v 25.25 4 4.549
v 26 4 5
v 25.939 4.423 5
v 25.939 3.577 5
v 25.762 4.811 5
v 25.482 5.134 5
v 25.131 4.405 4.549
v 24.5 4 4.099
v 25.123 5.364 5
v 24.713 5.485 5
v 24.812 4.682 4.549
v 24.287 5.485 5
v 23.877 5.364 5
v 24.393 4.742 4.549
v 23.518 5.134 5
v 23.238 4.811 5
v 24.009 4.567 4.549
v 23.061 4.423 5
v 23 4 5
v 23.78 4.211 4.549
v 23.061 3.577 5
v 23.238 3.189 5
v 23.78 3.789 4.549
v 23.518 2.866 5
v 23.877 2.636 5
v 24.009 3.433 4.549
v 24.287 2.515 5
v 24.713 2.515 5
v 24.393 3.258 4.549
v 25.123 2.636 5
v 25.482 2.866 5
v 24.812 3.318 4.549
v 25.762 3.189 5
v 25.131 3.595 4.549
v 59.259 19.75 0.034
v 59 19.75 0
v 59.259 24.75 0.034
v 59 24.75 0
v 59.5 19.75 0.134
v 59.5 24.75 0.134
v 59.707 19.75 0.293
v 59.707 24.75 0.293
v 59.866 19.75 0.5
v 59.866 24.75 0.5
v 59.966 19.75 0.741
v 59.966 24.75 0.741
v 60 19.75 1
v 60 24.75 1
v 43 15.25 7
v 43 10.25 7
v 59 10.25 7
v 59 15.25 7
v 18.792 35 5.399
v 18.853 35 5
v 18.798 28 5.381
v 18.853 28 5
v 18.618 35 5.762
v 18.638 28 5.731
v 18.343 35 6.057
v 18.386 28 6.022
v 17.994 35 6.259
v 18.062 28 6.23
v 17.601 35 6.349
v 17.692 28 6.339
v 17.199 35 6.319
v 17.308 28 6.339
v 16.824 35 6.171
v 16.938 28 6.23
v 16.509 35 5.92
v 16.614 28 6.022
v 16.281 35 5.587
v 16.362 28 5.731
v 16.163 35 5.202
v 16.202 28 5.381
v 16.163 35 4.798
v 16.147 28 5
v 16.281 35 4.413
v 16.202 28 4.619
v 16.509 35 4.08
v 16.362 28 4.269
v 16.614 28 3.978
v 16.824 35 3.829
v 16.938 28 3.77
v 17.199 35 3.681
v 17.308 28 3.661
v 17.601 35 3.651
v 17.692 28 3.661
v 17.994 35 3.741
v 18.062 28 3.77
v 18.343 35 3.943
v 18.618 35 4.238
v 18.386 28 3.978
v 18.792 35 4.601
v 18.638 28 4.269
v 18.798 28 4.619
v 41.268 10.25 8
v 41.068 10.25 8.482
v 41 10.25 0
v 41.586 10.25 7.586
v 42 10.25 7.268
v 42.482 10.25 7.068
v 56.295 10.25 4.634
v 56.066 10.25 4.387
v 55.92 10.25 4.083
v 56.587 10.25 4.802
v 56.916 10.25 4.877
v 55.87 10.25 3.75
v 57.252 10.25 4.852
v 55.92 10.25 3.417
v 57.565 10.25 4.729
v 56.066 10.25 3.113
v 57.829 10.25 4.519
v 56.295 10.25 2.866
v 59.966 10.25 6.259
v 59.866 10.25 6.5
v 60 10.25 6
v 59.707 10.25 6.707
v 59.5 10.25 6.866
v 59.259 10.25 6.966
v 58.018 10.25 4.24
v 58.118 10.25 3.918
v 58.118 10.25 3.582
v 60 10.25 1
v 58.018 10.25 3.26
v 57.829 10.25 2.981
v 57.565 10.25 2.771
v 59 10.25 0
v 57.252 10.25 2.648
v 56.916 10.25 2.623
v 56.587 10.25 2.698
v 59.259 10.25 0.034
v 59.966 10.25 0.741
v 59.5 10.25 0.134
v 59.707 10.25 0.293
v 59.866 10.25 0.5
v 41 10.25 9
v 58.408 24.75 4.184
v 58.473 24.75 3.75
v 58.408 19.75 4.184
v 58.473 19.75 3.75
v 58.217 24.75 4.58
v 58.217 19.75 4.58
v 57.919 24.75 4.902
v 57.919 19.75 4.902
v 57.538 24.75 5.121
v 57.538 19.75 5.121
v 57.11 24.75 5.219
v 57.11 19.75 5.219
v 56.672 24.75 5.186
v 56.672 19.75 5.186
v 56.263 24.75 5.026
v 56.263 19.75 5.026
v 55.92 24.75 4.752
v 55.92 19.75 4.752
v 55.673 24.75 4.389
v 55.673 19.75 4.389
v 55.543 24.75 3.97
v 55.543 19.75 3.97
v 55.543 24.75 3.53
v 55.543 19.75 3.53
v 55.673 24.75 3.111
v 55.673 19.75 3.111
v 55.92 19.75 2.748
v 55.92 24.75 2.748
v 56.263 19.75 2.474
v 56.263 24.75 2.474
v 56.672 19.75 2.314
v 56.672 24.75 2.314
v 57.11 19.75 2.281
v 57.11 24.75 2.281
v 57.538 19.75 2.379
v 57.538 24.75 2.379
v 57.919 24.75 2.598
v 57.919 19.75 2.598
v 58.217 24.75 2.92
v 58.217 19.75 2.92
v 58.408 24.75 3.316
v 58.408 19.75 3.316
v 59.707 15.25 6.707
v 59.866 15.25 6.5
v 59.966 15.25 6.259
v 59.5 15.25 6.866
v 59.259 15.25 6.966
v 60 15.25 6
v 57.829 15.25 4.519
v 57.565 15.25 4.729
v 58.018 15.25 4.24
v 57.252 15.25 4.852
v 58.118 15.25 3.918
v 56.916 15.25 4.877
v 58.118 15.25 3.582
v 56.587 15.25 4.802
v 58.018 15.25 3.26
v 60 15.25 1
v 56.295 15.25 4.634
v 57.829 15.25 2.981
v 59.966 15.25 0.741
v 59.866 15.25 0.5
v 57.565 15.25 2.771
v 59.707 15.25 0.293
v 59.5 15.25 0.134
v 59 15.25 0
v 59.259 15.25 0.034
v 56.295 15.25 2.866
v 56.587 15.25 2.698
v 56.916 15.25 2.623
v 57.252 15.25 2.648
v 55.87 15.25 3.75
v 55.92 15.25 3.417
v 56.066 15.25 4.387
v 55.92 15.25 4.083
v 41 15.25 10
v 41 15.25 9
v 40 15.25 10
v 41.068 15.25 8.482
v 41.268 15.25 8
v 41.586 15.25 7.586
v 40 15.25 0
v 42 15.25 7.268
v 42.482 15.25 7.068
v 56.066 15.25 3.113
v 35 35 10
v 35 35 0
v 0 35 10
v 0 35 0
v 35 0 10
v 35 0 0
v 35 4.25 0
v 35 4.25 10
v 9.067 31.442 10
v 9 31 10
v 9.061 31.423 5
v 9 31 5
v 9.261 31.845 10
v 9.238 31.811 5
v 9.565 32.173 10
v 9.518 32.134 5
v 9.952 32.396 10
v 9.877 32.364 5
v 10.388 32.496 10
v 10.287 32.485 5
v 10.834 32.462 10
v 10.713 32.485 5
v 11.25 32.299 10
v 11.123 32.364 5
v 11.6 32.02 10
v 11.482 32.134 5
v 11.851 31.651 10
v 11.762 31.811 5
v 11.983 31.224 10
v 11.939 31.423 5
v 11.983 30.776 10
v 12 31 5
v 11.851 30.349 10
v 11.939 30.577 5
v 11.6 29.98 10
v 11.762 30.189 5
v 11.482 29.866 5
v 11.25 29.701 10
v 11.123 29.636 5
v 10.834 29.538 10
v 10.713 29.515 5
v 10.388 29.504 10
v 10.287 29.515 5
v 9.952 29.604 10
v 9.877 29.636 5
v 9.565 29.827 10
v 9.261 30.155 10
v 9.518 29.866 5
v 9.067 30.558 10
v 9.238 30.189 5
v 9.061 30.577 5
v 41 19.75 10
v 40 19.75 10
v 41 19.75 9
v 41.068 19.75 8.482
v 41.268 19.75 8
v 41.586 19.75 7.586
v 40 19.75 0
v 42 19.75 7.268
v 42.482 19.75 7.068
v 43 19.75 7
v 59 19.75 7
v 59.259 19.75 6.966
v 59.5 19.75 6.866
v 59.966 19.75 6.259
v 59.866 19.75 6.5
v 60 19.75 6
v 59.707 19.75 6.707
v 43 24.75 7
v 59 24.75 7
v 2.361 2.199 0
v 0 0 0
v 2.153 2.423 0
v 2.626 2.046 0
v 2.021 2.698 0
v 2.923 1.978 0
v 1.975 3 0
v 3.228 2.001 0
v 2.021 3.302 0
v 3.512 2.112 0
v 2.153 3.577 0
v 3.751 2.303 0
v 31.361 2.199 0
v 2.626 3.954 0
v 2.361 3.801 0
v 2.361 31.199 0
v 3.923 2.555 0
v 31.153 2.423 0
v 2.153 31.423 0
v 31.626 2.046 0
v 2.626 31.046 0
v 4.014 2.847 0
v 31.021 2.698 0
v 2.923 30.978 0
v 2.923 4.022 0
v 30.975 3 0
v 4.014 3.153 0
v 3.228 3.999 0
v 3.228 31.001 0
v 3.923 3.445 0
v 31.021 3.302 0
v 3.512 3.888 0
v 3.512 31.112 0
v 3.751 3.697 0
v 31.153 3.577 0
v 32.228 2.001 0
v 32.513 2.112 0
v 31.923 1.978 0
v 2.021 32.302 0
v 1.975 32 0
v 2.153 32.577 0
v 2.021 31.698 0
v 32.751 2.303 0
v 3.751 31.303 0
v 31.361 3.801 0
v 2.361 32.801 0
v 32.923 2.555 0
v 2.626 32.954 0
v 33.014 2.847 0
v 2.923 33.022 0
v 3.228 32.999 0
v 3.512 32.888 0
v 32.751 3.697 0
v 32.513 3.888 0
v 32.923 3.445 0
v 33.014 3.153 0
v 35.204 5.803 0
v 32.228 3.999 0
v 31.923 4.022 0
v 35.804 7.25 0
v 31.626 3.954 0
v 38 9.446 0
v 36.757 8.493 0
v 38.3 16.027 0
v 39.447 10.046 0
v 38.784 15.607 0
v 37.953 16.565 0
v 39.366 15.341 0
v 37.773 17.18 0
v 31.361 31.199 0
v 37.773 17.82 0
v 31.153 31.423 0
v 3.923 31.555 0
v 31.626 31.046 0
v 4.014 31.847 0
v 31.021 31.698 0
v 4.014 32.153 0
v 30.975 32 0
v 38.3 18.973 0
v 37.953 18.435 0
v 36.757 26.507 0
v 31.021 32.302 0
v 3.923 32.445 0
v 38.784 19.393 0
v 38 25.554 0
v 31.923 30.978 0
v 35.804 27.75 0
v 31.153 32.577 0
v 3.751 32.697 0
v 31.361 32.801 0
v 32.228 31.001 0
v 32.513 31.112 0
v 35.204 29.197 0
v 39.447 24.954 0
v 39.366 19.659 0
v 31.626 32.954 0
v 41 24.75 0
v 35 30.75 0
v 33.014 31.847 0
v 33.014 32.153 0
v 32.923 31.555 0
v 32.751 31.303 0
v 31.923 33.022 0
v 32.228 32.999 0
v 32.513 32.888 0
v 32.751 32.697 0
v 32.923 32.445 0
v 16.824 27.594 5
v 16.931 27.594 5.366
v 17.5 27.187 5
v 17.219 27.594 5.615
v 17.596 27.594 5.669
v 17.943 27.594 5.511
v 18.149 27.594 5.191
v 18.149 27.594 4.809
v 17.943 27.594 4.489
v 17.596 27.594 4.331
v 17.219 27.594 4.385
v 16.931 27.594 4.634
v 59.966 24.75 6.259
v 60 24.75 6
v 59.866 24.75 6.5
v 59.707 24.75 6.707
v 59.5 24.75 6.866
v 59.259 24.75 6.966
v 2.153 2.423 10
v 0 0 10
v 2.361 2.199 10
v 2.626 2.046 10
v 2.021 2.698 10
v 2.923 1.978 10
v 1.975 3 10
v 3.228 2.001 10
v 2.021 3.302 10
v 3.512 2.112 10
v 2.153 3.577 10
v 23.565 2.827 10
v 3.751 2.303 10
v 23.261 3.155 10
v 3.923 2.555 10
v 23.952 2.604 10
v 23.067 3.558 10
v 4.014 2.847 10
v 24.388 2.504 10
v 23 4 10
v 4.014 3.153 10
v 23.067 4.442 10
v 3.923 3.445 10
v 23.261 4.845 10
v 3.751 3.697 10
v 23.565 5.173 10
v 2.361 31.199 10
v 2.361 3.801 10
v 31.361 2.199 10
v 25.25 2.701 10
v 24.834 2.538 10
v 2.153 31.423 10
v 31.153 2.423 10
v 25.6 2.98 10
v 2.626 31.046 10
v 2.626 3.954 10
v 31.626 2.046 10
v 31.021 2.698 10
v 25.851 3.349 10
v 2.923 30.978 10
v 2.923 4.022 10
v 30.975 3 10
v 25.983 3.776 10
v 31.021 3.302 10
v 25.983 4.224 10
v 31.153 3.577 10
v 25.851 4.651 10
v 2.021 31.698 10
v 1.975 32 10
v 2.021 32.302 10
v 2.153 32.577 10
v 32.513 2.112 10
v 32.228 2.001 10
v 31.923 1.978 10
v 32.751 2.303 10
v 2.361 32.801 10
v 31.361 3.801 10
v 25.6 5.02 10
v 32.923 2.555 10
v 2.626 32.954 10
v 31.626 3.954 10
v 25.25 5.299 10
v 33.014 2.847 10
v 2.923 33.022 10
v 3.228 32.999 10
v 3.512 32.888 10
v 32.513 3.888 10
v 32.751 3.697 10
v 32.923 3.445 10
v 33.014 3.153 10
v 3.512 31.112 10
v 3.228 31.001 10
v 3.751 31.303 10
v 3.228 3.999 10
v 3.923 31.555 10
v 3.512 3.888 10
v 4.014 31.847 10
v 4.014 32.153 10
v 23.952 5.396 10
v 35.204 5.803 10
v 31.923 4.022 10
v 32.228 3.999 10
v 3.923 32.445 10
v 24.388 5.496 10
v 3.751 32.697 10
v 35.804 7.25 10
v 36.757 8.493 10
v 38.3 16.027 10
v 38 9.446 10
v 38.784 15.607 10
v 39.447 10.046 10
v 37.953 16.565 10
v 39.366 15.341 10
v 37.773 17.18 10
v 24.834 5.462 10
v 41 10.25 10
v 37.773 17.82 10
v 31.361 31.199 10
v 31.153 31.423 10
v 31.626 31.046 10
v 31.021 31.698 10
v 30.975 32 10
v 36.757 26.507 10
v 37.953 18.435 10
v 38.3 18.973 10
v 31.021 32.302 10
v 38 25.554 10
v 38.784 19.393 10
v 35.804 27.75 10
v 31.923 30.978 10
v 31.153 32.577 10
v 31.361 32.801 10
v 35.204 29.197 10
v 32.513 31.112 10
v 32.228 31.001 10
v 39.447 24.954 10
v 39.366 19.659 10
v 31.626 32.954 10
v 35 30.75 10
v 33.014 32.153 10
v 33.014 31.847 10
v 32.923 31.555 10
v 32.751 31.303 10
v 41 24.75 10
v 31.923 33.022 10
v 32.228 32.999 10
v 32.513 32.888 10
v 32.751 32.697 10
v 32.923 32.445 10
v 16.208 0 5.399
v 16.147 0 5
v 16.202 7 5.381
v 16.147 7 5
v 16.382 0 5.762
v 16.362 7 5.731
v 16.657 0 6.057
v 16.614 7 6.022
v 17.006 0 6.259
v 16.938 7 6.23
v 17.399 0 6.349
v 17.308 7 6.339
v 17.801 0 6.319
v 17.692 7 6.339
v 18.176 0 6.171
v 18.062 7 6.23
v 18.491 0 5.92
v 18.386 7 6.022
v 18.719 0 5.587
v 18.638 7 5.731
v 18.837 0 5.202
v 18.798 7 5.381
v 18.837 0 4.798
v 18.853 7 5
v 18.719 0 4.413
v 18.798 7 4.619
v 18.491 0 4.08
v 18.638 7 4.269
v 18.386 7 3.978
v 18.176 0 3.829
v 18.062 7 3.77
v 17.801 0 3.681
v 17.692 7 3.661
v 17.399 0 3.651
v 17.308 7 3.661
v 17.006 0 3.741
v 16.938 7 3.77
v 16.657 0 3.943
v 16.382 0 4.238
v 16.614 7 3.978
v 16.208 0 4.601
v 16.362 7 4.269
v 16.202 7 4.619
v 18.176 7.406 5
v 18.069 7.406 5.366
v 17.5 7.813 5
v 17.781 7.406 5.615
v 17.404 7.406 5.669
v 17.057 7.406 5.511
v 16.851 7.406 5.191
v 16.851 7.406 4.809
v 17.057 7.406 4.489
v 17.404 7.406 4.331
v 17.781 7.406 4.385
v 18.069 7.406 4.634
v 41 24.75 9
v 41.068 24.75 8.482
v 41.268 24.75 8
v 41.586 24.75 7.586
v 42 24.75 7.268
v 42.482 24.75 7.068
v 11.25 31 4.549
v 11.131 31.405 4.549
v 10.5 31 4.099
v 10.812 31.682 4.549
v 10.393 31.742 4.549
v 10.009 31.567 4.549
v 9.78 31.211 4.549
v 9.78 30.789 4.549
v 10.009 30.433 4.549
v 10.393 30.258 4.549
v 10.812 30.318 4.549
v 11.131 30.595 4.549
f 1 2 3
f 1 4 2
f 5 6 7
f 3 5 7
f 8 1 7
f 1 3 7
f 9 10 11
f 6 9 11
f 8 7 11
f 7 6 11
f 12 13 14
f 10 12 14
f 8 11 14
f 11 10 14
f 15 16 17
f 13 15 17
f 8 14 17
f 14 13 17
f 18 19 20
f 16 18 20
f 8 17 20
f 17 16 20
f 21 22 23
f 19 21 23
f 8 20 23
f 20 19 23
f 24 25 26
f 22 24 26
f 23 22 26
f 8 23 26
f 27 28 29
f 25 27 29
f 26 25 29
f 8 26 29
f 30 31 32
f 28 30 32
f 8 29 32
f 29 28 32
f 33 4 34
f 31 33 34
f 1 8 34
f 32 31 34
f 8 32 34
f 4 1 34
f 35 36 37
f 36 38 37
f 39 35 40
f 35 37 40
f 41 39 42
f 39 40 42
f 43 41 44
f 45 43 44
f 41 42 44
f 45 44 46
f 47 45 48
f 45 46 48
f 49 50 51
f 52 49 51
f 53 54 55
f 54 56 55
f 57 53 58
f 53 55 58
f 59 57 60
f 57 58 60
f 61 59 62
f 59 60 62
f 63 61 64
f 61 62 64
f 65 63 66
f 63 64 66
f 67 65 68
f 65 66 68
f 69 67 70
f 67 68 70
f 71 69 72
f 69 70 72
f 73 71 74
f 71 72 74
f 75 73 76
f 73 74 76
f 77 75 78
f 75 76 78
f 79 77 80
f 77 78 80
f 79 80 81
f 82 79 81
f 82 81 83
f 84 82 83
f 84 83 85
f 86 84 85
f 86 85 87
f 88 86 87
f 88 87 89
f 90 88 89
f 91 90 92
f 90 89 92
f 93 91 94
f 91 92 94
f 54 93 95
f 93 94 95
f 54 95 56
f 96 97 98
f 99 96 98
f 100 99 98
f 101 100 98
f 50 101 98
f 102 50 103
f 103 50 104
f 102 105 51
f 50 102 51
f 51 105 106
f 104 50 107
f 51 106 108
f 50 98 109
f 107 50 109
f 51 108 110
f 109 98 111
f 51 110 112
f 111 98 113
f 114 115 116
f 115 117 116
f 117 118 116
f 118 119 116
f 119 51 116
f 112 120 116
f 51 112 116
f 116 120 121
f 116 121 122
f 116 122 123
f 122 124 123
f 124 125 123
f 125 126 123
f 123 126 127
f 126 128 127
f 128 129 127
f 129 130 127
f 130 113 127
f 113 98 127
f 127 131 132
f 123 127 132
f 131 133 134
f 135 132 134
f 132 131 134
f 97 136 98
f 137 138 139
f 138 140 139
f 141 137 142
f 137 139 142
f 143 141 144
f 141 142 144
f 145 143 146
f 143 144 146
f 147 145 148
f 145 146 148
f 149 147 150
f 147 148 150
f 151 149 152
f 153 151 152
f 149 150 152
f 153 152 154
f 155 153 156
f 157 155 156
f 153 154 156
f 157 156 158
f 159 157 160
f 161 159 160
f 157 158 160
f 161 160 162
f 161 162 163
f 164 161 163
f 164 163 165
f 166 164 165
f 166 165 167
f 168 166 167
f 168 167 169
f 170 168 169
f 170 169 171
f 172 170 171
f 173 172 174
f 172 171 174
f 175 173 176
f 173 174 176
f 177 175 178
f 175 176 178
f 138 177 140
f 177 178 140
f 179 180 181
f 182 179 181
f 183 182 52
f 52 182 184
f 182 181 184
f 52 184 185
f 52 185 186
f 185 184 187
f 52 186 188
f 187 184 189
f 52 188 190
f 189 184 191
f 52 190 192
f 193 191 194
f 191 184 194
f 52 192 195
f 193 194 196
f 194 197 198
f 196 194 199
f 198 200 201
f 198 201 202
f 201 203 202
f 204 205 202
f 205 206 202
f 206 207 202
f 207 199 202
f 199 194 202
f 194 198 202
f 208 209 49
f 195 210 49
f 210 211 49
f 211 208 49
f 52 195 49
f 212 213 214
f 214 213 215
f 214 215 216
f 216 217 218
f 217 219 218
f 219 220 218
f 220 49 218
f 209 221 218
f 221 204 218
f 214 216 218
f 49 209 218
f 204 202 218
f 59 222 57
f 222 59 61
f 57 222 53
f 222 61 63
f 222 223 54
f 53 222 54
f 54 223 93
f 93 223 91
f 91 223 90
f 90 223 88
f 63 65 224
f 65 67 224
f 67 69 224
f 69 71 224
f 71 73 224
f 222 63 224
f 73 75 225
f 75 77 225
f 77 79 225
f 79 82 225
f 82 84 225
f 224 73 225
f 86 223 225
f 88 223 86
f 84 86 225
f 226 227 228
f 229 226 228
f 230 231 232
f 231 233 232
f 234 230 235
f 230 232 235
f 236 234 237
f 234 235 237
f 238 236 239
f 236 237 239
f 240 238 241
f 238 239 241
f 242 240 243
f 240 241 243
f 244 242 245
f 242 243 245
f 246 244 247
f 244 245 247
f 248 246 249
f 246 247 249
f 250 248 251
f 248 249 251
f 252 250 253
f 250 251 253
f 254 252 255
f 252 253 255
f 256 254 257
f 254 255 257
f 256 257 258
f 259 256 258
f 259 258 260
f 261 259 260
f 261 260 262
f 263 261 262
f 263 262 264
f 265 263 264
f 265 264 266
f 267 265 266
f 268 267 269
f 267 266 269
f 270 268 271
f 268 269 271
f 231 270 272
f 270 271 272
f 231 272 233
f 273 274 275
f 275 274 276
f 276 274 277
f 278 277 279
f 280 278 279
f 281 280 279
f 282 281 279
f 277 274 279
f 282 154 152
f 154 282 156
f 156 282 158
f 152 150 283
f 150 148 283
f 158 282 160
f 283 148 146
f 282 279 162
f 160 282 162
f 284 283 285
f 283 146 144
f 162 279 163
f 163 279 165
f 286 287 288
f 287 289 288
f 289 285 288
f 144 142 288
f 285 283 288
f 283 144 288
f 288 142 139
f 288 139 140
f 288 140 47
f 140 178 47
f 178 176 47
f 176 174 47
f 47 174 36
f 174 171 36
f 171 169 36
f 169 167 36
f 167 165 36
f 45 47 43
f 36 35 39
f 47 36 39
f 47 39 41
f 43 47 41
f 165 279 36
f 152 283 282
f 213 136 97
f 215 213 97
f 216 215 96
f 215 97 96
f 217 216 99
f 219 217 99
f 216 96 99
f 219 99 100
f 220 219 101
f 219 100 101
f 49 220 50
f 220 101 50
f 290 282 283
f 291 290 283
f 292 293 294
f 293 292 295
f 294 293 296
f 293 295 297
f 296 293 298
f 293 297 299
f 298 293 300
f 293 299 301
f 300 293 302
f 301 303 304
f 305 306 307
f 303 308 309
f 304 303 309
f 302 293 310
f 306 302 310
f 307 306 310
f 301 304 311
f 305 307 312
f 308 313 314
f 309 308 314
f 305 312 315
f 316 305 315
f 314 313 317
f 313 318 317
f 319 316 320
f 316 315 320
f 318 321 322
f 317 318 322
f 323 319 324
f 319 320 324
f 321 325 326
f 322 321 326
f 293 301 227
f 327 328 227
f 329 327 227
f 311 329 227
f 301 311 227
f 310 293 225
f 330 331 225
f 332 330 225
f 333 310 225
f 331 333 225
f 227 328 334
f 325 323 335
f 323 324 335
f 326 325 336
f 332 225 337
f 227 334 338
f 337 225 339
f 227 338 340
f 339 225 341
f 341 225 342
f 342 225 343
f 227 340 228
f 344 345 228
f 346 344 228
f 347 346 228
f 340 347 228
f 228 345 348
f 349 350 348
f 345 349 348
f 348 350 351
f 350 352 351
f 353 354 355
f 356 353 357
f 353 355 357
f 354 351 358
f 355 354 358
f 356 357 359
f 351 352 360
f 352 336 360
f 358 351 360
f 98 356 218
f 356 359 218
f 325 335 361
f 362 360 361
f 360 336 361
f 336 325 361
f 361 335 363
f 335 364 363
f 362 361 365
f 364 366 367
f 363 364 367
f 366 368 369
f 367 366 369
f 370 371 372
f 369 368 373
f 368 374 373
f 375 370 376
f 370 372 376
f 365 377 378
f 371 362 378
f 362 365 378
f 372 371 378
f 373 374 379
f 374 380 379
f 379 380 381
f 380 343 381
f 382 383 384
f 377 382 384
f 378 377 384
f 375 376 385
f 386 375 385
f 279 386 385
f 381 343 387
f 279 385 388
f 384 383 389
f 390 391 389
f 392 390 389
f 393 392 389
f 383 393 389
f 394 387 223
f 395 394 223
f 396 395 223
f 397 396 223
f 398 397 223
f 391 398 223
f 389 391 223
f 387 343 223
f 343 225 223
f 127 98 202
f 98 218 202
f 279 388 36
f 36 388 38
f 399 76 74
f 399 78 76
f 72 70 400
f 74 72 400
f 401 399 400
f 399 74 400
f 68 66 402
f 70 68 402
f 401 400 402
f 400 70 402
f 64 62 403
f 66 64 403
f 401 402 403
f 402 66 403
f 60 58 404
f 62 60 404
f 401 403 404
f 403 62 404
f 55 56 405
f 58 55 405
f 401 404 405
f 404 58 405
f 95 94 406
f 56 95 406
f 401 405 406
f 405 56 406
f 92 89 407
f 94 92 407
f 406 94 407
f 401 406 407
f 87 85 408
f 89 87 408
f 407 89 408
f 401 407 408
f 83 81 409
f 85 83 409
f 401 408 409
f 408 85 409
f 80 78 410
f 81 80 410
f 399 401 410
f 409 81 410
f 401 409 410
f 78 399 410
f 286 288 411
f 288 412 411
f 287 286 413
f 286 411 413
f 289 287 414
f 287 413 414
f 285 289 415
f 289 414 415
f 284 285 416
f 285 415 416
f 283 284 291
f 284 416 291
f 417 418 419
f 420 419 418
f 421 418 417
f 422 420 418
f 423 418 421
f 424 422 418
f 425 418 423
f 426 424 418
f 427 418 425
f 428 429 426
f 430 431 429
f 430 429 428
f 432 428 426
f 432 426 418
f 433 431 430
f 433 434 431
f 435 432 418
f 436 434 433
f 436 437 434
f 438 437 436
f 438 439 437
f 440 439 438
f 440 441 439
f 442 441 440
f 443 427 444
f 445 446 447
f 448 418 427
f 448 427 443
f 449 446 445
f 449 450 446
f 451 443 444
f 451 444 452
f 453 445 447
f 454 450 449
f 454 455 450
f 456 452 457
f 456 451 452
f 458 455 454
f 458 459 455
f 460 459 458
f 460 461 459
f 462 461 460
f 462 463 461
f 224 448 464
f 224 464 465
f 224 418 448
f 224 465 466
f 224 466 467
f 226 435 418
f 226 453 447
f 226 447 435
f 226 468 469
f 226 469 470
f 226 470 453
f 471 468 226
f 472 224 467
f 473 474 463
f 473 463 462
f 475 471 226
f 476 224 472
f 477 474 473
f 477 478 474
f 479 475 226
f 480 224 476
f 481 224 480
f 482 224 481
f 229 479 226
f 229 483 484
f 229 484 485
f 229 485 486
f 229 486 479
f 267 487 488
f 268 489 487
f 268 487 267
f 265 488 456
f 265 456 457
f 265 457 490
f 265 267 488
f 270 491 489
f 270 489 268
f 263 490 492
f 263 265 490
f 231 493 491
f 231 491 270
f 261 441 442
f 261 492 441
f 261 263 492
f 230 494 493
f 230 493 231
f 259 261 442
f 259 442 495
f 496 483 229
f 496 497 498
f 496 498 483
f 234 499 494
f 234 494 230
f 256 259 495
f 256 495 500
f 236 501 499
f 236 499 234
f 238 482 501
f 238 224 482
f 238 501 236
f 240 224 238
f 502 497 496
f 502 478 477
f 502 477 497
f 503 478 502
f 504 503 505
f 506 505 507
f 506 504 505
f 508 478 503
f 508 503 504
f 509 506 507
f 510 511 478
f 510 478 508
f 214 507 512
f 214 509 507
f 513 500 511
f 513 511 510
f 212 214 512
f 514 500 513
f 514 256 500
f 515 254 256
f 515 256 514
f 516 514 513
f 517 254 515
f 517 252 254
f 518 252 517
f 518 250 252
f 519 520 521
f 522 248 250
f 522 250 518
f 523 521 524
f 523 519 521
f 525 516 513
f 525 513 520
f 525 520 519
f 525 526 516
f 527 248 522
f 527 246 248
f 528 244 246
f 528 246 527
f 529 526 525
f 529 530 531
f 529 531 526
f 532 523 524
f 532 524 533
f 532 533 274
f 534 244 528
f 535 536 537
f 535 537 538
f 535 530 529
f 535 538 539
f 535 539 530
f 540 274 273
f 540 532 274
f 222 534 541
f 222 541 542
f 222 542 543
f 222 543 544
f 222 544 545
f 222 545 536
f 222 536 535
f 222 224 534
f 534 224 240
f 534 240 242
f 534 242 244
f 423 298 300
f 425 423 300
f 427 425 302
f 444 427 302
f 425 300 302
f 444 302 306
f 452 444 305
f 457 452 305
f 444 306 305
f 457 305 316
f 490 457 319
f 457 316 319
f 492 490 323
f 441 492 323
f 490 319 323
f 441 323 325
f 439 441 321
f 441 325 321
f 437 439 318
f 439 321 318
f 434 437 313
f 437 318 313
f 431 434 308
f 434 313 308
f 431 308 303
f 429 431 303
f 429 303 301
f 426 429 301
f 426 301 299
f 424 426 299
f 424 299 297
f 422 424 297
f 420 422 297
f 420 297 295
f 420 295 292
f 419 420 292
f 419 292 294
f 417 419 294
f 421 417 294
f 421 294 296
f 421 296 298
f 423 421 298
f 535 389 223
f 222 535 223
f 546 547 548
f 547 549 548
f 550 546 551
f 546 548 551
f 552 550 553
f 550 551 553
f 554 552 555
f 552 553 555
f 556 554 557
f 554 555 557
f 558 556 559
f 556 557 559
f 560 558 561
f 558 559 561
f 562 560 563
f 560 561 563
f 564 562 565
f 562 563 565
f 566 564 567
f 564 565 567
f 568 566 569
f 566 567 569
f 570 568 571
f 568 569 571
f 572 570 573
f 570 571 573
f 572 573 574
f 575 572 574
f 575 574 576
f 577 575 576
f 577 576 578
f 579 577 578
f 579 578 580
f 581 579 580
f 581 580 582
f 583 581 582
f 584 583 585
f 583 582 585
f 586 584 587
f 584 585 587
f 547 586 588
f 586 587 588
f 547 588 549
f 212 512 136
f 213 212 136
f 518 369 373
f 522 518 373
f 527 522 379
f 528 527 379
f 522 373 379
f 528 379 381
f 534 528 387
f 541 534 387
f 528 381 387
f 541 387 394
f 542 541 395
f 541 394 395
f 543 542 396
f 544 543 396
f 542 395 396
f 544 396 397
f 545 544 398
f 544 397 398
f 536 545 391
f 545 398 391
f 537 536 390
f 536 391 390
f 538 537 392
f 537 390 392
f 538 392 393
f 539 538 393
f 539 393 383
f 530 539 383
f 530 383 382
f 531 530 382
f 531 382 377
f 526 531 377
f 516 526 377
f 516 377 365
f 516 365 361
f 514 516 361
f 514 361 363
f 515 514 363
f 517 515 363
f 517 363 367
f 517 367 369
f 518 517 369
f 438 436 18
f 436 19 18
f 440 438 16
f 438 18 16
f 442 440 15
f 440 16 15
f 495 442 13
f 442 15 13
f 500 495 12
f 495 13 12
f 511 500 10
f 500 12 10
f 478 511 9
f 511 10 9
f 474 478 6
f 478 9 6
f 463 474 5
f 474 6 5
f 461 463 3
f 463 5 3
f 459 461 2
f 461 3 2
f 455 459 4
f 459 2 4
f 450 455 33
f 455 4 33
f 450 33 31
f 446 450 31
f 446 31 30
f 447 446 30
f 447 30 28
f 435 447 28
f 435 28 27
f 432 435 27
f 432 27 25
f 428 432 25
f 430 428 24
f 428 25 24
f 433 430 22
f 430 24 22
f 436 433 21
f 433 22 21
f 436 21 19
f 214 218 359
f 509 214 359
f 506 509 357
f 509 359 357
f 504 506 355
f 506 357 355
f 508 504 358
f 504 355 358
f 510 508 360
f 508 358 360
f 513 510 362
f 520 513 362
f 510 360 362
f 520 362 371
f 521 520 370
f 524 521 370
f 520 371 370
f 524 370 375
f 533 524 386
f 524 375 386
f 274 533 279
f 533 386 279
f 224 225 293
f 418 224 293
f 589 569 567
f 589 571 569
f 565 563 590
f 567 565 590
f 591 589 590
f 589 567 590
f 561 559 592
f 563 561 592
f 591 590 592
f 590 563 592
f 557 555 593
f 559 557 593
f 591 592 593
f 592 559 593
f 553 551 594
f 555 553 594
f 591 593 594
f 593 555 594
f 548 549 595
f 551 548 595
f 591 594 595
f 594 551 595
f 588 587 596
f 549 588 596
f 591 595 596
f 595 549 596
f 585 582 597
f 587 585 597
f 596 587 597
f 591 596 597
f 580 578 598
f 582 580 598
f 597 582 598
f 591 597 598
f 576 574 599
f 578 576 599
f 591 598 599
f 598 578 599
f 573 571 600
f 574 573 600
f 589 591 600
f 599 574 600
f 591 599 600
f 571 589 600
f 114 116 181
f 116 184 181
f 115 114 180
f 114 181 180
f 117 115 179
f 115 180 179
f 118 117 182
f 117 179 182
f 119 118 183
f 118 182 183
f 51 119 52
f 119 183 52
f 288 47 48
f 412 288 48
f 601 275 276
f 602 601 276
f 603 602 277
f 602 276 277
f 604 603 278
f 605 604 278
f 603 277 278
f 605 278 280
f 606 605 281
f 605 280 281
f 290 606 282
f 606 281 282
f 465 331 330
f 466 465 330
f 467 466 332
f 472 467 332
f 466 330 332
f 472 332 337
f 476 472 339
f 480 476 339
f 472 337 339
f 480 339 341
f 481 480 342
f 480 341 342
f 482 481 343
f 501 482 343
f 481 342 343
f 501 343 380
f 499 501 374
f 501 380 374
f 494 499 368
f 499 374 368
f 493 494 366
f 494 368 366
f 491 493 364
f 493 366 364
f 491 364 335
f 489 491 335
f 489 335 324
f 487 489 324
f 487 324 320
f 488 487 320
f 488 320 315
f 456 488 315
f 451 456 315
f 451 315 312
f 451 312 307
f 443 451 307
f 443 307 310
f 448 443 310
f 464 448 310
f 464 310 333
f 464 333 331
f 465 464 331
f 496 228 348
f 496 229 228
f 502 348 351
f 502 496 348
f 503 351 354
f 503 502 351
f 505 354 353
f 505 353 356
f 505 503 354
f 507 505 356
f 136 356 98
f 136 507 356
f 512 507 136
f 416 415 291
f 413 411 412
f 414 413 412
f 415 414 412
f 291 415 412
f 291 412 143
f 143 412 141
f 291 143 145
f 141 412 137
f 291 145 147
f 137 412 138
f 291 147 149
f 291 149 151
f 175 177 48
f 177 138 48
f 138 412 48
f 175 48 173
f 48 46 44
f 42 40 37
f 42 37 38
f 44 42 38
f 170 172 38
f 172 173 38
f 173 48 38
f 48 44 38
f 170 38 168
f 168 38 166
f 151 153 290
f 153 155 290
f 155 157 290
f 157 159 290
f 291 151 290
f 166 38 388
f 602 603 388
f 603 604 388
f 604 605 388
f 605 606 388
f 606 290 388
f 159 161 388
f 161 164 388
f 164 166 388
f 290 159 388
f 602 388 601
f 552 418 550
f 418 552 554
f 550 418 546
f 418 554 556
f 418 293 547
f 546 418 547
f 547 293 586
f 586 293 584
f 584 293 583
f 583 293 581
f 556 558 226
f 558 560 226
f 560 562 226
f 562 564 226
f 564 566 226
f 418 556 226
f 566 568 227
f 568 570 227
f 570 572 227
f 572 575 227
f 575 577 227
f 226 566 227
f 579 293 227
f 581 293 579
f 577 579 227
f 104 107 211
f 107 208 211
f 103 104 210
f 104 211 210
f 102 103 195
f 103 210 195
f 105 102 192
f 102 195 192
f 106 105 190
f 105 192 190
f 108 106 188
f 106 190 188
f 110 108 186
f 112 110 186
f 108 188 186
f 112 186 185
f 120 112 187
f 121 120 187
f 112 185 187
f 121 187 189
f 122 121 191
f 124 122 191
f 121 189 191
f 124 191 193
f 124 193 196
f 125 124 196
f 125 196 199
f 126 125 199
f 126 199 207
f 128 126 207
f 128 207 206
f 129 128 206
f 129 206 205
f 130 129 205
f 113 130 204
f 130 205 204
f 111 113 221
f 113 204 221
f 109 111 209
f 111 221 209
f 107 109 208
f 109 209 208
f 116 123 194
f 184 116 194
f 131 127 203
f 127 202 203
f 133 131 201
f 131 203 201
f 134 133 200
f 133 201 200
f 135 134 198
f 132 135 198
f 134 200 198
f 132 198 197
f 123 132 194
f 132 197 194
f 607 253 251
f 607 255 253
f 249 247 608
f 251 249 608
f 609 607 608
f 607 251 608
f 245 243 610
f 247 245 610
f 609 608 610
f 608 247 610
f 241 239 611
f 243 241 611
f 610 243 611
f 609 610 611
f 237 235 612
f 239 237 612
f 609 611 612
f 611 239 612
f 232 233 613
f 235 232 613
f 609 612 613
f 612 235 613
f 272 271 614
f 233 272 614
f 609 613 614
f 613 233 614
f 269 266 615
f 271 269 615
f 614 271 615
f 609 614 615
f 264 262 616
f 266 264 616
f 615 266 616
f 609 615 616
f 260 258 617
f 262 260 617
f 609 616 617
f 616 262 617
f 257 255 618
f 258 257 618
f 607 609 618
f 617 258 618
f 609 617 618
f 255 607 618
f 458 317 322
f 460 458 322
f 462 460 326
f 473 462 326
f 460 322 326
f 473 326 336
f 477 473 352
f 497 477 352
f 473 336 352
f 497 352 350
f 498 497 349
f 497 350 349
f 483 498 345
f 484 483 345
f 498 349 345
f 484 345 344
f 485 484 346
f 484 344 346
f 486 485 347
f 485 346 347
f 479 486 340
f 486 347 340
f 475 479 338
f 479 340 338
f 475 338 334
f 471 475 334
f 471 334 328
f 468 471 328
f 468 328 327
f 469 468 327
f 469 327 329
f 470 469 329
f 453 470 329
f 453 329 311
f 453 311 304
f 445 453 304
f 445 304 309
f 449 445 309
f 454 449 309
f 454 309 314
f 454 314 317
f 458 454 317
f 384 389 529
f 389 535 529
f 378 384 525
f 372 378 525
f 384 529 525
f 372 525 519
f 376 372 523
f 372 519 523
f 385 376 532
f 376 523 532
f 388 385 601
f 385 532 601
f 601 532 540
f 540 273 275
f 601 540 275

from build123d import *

# Parameters (mm, degrees)
F1_DEPTH         = 10
F3_D             = 2.05
F4_D             = 3
F4_DEPTH         = 5
F4_TIP           = 0.9012909285
F5_R             = 6
F7_DEPTH         = 24.751
F8_R             = 1
F10_D            = 2.9464
F10_DEPTH        = 5
F10_TIP          = 0.885187864
F12_D            = 2.2606
F12_DEPTH        = 5
F12_TIP          = 0.6791527577
F15_D            = 2.7051
F15_DEPTH        = 7
F15_TIP          = 0.8126940303
F15_ON_F14_D     = 2.7051
F15_ON_F14_DEPTH = 7
F15_ON_F14_TIP   = 0.8126940303


with BuildPart() as f1:
    # F0 (on Top) → F1 (new body)
    with BuildSketch(Plane.XY):
        with BuildLine():
            Line((0, 35), (0, 0))
            Line((0, 0), (35, 0))
            Line((35, 0), (35, 10.25))
            Line((35, 10.25), (60, 10.25))
            Line((60, 10.25), (60, 15.25))
            Line((60, 15.25), (40, 15.25))
            ThreePointArc((40, 15.25), (37.75, 17.5), (40, 19.75))
            Line((40, 19.75), (60, 19.75))
            Line((60, 19.75), (60, 24.75))
            Line((60, 24.75), (35, 24.75))
            Line((35, 24.75), (35, 35))
            Line((35, 35), (0, 35))
        make_face()
    extrude(amount=F1_DEPTH)

    # F3 (through all)
    with Locations(Plane.XY.offset(10)):
        with Locations((3, 32), (32, 32), (32, 3), (3, 3)):
            Hole(F3_D / 2)

    # F4
    with Locations(Plane.XY.offset(10)):
        with Locations((10.5, 31), (24.5, 4)):
            Hole(F4_D / 2, depth=F4_DEPTH)
            with Locations((0, 0, -(F4_DEPTH + F4_TIP / 2))):  # 118° drill point
                Cone(0, F4_D / 2, F4_TIP, mode=Mode.SUBTRACT)

    # F5
    f5_edges = [f1.edges().sort_by_distance(p)[0] for p in [
        (35, 10.25, 5),
        (35, 24.75, 5),
    ]]
    fillet(f5_edges, radius=F5_R)

    # F6 (on face) → F7 (cut, through all)
    with BuildSketch(Plane.XZ.offset(-10.25)):
        with BuildLine():
            Line((43, 7), (60, 7))
            Line((60, 7), (60, 10))
            Line((60, 10), (41, 10))
            Line((41, 10), (41, 9))
            ThreePointArc((41, 9), (41.5857864376, 7.5857864376), (43, 7))
        make_face()
    extrude(amount=-F7_DEPTH, mode=Mode.SUBTRACT)

    # F8
    f8_edges = [f1.edges().sort_by_distance(p)[0] for p in [
        (60, 12.75, 7),
        (60, 22.25, 7),
        (60, 22.25, 0),
        (60, 12.75, 0),
    ]]
    fillet(f8_edges, radius=F8_R)

    # F10
    with Locations(Plane(origin=(0, 24.75, 0), x_dir=(-1, 0, 0), z_dir=(0, 1, 0))):
        with Locations((-57, 3.75)):
            Hole(F10_D / 2, depth=F10_DEPTH)
            with Locations((0, 0, -(F10_DEPTH + F10_TIP / 2))):  # 118° drill point
                Cone(0, F10_D / 2, F10_TIP, mode=Mode.SUBTRACT)

    # F12
    with Locations(Plane.XZ.offset(-10.25)):
        with Locations((57, 3.75)):
            Hole(F12_D / 2, depth=F12_DEPTH)
            with Locations((0, 0, -(F12_DEPTH + F12_TIP / 2))):  # 118° drill point
                Cone(0, F12_D / 2, F12_TIP, mode=Mode.SUBTRACT)

    # F15
    with Locations(Plane(origin=(0, 35, 0), x_dir=(-1, 0, 0), z_dir=(0, 1, 0))):
        with Locations((-17.5, 5)):
            Hole(F15_D / 2, depth=F15_DEPTH)
            with Locations((0, 0, -(F15_DEPTH + F15_TIP / 2))):  # 118° drill point
                Cone(0, F15_D / 2, F15_TIP, mode=Mode.SUBTRACT)

    # F15 on F14
    with Locations(Plane.XZ):
        with Locations((17.5, 5)):
            Hole(F15_ON_F14_D / 2, depth=F15_ON_F14_DEPTH)
            with Locations((0, 0, -(F15_ON_F14_DEPTH + F15_ON_F14_TIP / 2))):  # 118° drill point
                Cone(0, F15_ON_F14_D / 2, F15_ON_F14_TIP, mode=Mode.SUBTRACT)


solid = f1.part
